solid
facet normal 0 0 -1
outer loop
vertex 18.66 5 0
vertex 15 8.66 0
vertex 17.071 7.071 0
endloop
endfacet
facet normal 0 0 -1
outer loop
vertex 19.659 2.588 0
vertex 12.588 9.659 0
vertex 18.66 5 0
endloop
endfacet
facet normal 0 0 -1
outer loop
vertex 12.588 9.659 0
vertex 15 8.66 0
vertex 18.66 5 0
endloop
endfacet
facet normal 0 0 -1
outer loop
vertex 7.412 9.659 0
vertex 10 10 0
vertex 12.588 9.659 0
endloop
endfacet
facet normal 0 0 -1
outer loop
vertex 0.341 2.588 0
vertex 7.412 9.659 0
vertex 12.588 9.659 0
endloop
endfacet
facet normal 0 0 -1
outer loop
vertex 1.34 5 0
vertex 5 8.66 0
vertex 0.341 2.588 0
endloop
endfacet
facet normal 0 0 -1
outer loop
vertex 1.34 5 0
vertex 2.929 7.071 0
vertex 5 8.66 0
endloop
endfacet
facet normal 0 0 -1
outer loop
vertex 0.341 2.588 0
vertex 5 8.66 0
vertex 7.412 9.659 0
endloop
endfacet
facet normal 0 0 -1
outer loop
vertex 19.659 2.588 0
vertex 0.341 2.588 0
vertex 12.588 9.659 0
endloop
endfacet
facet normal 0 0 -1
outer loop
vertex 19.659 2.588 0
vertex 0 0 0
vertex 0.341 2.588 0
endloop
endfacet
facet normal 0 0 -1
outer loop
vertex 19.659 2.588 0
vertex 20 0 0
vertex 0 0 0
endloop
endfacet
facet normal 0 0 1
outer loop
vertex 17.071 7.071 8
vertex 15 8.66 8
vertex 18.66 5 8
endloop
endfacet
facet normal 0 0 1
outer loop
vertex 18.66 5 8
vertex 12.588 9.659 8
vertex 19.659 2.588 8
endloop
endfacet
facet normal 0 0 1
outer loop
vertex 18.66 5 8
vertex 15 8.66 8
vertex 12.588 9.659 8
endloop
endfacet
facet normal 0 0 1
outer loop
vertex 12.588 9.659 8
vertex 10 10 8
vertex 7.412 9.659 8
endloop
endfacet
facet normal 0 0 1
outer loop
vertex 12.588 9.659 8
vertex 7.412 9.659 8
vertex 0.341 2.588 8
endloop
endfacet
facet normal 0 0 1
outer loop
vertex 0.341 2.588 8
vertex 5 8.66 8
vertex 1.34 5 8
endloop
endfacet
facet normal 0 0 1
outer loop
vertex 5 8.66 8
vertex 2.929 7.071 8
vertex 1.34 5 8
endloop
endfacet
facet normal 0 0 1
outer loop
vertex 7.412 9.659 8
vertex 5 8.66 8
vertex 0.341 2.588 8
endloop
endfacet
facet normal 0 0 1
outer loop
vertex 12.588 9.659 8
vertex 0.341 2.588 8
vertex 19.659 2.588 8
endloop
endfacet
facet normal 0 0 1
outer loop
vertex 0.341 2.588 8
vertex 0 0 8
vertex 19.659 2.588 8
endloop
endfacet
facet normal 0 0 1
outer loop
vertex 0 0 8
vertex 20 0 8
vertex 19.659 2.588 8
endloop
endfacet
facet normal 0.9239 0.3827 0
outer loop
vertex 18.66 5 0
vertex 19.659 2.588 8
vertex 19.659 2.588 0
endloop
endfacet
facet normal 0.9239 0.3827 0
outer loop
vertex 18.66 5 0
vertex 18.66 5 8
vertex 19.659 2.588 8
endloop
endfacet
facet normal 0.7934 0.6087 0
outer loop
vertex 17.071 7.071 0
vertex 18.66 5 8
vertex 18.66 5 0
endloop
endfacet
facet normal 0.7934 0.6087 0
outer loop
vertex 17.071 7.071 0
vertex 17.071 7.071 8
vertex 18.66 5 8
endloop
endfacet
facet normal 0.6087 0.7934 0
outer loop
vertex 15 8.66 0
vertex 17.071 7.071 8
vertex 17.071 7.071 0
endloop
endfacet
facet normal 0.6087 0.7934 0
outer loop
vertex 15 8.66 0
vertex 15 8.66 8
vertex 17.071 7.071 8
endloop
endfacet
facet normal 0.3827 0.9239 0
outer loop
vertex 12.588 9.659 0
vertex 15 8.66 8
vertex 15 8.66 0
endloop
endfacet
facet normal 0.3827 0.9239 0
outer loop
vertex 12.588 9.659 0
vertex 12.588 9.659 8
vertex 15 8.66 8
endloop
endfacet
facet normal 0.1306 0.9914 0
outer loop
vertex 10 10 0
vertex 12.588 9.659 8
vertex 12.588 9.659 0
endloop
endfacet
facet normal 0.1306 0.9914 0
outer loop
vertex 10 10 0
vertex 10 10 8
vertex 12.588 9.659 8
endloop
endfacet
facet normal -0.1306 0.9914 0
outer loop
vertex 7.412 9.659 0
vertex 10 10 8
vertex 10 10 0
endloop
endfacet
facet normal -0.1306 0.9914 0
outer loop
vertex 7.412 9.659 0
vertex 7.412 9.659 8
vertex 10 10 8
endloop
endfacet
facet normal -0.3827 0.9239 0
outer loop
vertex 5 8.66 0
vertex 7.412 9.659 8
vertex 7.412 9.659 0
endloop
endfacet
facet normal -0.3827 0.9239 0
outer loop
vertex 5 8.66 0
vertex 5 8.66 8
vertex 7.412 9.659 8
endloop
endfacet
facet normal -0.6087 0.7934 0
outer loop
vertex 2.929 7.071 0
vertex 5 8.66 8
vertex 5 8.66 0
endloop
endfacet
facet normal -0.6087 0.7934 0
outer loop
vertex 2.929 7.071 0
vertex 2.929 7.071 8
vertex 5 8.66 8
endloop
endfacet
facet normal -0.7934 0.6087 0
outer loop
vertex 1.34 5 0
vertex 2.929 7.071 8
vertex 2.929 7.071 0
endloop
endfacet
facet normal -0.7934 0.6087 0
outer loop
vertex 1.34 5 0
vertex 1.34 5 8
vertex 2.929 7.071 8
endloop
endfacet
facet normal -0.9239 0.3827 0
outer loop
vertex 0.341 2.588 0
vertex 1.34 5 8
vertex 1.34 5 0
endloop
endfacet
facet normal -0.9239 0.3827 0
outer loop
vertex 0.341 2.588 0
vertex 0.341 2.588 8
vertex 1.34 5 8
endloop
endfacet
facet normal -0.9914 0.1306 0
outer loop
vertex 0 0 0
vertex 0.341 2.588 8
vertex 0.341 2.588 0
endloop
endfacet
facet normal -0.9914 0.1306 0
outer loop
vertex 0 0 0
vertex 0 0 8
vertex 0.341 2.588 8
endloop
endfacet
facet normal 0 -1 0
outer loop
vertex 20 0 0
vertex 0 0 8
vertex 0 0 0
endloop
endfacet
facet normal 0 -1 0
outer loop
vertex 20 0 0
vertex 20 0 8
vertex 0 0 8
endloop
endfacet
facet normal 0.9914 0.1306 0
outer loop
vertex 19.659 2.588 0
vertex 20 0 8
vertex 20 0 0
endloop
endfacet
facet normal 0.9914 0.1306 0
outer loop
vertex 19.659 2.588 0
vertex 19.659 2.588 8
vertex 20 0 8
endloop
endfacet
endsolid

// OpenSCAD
$fn = 32;

// ----------------------------------------------------------------------
// Key bar: woodruff key, 8 mm thick
// ----------------------------------------------------------------------

// --- parameters (mm) ---
profile_height = 8;       // extrusion height
profile_points = 13;      // points of the closed outline

profile = [[20, 0], [19.659, 2.588], [18.66, 5], [17.071, 7.071], [15, 8.66], [12.588, 9.659], [10, 10], [7.412, 9.659], [5, 8.66], [2.929, 7.071], [1.34, 5], [0.341, 2.588], [0, 0]];  // single closed polygon, 13 points, counter clockwise

// --- the one profile operation ---
linear_extrude(height = profile_height) polygon(points = profile);
